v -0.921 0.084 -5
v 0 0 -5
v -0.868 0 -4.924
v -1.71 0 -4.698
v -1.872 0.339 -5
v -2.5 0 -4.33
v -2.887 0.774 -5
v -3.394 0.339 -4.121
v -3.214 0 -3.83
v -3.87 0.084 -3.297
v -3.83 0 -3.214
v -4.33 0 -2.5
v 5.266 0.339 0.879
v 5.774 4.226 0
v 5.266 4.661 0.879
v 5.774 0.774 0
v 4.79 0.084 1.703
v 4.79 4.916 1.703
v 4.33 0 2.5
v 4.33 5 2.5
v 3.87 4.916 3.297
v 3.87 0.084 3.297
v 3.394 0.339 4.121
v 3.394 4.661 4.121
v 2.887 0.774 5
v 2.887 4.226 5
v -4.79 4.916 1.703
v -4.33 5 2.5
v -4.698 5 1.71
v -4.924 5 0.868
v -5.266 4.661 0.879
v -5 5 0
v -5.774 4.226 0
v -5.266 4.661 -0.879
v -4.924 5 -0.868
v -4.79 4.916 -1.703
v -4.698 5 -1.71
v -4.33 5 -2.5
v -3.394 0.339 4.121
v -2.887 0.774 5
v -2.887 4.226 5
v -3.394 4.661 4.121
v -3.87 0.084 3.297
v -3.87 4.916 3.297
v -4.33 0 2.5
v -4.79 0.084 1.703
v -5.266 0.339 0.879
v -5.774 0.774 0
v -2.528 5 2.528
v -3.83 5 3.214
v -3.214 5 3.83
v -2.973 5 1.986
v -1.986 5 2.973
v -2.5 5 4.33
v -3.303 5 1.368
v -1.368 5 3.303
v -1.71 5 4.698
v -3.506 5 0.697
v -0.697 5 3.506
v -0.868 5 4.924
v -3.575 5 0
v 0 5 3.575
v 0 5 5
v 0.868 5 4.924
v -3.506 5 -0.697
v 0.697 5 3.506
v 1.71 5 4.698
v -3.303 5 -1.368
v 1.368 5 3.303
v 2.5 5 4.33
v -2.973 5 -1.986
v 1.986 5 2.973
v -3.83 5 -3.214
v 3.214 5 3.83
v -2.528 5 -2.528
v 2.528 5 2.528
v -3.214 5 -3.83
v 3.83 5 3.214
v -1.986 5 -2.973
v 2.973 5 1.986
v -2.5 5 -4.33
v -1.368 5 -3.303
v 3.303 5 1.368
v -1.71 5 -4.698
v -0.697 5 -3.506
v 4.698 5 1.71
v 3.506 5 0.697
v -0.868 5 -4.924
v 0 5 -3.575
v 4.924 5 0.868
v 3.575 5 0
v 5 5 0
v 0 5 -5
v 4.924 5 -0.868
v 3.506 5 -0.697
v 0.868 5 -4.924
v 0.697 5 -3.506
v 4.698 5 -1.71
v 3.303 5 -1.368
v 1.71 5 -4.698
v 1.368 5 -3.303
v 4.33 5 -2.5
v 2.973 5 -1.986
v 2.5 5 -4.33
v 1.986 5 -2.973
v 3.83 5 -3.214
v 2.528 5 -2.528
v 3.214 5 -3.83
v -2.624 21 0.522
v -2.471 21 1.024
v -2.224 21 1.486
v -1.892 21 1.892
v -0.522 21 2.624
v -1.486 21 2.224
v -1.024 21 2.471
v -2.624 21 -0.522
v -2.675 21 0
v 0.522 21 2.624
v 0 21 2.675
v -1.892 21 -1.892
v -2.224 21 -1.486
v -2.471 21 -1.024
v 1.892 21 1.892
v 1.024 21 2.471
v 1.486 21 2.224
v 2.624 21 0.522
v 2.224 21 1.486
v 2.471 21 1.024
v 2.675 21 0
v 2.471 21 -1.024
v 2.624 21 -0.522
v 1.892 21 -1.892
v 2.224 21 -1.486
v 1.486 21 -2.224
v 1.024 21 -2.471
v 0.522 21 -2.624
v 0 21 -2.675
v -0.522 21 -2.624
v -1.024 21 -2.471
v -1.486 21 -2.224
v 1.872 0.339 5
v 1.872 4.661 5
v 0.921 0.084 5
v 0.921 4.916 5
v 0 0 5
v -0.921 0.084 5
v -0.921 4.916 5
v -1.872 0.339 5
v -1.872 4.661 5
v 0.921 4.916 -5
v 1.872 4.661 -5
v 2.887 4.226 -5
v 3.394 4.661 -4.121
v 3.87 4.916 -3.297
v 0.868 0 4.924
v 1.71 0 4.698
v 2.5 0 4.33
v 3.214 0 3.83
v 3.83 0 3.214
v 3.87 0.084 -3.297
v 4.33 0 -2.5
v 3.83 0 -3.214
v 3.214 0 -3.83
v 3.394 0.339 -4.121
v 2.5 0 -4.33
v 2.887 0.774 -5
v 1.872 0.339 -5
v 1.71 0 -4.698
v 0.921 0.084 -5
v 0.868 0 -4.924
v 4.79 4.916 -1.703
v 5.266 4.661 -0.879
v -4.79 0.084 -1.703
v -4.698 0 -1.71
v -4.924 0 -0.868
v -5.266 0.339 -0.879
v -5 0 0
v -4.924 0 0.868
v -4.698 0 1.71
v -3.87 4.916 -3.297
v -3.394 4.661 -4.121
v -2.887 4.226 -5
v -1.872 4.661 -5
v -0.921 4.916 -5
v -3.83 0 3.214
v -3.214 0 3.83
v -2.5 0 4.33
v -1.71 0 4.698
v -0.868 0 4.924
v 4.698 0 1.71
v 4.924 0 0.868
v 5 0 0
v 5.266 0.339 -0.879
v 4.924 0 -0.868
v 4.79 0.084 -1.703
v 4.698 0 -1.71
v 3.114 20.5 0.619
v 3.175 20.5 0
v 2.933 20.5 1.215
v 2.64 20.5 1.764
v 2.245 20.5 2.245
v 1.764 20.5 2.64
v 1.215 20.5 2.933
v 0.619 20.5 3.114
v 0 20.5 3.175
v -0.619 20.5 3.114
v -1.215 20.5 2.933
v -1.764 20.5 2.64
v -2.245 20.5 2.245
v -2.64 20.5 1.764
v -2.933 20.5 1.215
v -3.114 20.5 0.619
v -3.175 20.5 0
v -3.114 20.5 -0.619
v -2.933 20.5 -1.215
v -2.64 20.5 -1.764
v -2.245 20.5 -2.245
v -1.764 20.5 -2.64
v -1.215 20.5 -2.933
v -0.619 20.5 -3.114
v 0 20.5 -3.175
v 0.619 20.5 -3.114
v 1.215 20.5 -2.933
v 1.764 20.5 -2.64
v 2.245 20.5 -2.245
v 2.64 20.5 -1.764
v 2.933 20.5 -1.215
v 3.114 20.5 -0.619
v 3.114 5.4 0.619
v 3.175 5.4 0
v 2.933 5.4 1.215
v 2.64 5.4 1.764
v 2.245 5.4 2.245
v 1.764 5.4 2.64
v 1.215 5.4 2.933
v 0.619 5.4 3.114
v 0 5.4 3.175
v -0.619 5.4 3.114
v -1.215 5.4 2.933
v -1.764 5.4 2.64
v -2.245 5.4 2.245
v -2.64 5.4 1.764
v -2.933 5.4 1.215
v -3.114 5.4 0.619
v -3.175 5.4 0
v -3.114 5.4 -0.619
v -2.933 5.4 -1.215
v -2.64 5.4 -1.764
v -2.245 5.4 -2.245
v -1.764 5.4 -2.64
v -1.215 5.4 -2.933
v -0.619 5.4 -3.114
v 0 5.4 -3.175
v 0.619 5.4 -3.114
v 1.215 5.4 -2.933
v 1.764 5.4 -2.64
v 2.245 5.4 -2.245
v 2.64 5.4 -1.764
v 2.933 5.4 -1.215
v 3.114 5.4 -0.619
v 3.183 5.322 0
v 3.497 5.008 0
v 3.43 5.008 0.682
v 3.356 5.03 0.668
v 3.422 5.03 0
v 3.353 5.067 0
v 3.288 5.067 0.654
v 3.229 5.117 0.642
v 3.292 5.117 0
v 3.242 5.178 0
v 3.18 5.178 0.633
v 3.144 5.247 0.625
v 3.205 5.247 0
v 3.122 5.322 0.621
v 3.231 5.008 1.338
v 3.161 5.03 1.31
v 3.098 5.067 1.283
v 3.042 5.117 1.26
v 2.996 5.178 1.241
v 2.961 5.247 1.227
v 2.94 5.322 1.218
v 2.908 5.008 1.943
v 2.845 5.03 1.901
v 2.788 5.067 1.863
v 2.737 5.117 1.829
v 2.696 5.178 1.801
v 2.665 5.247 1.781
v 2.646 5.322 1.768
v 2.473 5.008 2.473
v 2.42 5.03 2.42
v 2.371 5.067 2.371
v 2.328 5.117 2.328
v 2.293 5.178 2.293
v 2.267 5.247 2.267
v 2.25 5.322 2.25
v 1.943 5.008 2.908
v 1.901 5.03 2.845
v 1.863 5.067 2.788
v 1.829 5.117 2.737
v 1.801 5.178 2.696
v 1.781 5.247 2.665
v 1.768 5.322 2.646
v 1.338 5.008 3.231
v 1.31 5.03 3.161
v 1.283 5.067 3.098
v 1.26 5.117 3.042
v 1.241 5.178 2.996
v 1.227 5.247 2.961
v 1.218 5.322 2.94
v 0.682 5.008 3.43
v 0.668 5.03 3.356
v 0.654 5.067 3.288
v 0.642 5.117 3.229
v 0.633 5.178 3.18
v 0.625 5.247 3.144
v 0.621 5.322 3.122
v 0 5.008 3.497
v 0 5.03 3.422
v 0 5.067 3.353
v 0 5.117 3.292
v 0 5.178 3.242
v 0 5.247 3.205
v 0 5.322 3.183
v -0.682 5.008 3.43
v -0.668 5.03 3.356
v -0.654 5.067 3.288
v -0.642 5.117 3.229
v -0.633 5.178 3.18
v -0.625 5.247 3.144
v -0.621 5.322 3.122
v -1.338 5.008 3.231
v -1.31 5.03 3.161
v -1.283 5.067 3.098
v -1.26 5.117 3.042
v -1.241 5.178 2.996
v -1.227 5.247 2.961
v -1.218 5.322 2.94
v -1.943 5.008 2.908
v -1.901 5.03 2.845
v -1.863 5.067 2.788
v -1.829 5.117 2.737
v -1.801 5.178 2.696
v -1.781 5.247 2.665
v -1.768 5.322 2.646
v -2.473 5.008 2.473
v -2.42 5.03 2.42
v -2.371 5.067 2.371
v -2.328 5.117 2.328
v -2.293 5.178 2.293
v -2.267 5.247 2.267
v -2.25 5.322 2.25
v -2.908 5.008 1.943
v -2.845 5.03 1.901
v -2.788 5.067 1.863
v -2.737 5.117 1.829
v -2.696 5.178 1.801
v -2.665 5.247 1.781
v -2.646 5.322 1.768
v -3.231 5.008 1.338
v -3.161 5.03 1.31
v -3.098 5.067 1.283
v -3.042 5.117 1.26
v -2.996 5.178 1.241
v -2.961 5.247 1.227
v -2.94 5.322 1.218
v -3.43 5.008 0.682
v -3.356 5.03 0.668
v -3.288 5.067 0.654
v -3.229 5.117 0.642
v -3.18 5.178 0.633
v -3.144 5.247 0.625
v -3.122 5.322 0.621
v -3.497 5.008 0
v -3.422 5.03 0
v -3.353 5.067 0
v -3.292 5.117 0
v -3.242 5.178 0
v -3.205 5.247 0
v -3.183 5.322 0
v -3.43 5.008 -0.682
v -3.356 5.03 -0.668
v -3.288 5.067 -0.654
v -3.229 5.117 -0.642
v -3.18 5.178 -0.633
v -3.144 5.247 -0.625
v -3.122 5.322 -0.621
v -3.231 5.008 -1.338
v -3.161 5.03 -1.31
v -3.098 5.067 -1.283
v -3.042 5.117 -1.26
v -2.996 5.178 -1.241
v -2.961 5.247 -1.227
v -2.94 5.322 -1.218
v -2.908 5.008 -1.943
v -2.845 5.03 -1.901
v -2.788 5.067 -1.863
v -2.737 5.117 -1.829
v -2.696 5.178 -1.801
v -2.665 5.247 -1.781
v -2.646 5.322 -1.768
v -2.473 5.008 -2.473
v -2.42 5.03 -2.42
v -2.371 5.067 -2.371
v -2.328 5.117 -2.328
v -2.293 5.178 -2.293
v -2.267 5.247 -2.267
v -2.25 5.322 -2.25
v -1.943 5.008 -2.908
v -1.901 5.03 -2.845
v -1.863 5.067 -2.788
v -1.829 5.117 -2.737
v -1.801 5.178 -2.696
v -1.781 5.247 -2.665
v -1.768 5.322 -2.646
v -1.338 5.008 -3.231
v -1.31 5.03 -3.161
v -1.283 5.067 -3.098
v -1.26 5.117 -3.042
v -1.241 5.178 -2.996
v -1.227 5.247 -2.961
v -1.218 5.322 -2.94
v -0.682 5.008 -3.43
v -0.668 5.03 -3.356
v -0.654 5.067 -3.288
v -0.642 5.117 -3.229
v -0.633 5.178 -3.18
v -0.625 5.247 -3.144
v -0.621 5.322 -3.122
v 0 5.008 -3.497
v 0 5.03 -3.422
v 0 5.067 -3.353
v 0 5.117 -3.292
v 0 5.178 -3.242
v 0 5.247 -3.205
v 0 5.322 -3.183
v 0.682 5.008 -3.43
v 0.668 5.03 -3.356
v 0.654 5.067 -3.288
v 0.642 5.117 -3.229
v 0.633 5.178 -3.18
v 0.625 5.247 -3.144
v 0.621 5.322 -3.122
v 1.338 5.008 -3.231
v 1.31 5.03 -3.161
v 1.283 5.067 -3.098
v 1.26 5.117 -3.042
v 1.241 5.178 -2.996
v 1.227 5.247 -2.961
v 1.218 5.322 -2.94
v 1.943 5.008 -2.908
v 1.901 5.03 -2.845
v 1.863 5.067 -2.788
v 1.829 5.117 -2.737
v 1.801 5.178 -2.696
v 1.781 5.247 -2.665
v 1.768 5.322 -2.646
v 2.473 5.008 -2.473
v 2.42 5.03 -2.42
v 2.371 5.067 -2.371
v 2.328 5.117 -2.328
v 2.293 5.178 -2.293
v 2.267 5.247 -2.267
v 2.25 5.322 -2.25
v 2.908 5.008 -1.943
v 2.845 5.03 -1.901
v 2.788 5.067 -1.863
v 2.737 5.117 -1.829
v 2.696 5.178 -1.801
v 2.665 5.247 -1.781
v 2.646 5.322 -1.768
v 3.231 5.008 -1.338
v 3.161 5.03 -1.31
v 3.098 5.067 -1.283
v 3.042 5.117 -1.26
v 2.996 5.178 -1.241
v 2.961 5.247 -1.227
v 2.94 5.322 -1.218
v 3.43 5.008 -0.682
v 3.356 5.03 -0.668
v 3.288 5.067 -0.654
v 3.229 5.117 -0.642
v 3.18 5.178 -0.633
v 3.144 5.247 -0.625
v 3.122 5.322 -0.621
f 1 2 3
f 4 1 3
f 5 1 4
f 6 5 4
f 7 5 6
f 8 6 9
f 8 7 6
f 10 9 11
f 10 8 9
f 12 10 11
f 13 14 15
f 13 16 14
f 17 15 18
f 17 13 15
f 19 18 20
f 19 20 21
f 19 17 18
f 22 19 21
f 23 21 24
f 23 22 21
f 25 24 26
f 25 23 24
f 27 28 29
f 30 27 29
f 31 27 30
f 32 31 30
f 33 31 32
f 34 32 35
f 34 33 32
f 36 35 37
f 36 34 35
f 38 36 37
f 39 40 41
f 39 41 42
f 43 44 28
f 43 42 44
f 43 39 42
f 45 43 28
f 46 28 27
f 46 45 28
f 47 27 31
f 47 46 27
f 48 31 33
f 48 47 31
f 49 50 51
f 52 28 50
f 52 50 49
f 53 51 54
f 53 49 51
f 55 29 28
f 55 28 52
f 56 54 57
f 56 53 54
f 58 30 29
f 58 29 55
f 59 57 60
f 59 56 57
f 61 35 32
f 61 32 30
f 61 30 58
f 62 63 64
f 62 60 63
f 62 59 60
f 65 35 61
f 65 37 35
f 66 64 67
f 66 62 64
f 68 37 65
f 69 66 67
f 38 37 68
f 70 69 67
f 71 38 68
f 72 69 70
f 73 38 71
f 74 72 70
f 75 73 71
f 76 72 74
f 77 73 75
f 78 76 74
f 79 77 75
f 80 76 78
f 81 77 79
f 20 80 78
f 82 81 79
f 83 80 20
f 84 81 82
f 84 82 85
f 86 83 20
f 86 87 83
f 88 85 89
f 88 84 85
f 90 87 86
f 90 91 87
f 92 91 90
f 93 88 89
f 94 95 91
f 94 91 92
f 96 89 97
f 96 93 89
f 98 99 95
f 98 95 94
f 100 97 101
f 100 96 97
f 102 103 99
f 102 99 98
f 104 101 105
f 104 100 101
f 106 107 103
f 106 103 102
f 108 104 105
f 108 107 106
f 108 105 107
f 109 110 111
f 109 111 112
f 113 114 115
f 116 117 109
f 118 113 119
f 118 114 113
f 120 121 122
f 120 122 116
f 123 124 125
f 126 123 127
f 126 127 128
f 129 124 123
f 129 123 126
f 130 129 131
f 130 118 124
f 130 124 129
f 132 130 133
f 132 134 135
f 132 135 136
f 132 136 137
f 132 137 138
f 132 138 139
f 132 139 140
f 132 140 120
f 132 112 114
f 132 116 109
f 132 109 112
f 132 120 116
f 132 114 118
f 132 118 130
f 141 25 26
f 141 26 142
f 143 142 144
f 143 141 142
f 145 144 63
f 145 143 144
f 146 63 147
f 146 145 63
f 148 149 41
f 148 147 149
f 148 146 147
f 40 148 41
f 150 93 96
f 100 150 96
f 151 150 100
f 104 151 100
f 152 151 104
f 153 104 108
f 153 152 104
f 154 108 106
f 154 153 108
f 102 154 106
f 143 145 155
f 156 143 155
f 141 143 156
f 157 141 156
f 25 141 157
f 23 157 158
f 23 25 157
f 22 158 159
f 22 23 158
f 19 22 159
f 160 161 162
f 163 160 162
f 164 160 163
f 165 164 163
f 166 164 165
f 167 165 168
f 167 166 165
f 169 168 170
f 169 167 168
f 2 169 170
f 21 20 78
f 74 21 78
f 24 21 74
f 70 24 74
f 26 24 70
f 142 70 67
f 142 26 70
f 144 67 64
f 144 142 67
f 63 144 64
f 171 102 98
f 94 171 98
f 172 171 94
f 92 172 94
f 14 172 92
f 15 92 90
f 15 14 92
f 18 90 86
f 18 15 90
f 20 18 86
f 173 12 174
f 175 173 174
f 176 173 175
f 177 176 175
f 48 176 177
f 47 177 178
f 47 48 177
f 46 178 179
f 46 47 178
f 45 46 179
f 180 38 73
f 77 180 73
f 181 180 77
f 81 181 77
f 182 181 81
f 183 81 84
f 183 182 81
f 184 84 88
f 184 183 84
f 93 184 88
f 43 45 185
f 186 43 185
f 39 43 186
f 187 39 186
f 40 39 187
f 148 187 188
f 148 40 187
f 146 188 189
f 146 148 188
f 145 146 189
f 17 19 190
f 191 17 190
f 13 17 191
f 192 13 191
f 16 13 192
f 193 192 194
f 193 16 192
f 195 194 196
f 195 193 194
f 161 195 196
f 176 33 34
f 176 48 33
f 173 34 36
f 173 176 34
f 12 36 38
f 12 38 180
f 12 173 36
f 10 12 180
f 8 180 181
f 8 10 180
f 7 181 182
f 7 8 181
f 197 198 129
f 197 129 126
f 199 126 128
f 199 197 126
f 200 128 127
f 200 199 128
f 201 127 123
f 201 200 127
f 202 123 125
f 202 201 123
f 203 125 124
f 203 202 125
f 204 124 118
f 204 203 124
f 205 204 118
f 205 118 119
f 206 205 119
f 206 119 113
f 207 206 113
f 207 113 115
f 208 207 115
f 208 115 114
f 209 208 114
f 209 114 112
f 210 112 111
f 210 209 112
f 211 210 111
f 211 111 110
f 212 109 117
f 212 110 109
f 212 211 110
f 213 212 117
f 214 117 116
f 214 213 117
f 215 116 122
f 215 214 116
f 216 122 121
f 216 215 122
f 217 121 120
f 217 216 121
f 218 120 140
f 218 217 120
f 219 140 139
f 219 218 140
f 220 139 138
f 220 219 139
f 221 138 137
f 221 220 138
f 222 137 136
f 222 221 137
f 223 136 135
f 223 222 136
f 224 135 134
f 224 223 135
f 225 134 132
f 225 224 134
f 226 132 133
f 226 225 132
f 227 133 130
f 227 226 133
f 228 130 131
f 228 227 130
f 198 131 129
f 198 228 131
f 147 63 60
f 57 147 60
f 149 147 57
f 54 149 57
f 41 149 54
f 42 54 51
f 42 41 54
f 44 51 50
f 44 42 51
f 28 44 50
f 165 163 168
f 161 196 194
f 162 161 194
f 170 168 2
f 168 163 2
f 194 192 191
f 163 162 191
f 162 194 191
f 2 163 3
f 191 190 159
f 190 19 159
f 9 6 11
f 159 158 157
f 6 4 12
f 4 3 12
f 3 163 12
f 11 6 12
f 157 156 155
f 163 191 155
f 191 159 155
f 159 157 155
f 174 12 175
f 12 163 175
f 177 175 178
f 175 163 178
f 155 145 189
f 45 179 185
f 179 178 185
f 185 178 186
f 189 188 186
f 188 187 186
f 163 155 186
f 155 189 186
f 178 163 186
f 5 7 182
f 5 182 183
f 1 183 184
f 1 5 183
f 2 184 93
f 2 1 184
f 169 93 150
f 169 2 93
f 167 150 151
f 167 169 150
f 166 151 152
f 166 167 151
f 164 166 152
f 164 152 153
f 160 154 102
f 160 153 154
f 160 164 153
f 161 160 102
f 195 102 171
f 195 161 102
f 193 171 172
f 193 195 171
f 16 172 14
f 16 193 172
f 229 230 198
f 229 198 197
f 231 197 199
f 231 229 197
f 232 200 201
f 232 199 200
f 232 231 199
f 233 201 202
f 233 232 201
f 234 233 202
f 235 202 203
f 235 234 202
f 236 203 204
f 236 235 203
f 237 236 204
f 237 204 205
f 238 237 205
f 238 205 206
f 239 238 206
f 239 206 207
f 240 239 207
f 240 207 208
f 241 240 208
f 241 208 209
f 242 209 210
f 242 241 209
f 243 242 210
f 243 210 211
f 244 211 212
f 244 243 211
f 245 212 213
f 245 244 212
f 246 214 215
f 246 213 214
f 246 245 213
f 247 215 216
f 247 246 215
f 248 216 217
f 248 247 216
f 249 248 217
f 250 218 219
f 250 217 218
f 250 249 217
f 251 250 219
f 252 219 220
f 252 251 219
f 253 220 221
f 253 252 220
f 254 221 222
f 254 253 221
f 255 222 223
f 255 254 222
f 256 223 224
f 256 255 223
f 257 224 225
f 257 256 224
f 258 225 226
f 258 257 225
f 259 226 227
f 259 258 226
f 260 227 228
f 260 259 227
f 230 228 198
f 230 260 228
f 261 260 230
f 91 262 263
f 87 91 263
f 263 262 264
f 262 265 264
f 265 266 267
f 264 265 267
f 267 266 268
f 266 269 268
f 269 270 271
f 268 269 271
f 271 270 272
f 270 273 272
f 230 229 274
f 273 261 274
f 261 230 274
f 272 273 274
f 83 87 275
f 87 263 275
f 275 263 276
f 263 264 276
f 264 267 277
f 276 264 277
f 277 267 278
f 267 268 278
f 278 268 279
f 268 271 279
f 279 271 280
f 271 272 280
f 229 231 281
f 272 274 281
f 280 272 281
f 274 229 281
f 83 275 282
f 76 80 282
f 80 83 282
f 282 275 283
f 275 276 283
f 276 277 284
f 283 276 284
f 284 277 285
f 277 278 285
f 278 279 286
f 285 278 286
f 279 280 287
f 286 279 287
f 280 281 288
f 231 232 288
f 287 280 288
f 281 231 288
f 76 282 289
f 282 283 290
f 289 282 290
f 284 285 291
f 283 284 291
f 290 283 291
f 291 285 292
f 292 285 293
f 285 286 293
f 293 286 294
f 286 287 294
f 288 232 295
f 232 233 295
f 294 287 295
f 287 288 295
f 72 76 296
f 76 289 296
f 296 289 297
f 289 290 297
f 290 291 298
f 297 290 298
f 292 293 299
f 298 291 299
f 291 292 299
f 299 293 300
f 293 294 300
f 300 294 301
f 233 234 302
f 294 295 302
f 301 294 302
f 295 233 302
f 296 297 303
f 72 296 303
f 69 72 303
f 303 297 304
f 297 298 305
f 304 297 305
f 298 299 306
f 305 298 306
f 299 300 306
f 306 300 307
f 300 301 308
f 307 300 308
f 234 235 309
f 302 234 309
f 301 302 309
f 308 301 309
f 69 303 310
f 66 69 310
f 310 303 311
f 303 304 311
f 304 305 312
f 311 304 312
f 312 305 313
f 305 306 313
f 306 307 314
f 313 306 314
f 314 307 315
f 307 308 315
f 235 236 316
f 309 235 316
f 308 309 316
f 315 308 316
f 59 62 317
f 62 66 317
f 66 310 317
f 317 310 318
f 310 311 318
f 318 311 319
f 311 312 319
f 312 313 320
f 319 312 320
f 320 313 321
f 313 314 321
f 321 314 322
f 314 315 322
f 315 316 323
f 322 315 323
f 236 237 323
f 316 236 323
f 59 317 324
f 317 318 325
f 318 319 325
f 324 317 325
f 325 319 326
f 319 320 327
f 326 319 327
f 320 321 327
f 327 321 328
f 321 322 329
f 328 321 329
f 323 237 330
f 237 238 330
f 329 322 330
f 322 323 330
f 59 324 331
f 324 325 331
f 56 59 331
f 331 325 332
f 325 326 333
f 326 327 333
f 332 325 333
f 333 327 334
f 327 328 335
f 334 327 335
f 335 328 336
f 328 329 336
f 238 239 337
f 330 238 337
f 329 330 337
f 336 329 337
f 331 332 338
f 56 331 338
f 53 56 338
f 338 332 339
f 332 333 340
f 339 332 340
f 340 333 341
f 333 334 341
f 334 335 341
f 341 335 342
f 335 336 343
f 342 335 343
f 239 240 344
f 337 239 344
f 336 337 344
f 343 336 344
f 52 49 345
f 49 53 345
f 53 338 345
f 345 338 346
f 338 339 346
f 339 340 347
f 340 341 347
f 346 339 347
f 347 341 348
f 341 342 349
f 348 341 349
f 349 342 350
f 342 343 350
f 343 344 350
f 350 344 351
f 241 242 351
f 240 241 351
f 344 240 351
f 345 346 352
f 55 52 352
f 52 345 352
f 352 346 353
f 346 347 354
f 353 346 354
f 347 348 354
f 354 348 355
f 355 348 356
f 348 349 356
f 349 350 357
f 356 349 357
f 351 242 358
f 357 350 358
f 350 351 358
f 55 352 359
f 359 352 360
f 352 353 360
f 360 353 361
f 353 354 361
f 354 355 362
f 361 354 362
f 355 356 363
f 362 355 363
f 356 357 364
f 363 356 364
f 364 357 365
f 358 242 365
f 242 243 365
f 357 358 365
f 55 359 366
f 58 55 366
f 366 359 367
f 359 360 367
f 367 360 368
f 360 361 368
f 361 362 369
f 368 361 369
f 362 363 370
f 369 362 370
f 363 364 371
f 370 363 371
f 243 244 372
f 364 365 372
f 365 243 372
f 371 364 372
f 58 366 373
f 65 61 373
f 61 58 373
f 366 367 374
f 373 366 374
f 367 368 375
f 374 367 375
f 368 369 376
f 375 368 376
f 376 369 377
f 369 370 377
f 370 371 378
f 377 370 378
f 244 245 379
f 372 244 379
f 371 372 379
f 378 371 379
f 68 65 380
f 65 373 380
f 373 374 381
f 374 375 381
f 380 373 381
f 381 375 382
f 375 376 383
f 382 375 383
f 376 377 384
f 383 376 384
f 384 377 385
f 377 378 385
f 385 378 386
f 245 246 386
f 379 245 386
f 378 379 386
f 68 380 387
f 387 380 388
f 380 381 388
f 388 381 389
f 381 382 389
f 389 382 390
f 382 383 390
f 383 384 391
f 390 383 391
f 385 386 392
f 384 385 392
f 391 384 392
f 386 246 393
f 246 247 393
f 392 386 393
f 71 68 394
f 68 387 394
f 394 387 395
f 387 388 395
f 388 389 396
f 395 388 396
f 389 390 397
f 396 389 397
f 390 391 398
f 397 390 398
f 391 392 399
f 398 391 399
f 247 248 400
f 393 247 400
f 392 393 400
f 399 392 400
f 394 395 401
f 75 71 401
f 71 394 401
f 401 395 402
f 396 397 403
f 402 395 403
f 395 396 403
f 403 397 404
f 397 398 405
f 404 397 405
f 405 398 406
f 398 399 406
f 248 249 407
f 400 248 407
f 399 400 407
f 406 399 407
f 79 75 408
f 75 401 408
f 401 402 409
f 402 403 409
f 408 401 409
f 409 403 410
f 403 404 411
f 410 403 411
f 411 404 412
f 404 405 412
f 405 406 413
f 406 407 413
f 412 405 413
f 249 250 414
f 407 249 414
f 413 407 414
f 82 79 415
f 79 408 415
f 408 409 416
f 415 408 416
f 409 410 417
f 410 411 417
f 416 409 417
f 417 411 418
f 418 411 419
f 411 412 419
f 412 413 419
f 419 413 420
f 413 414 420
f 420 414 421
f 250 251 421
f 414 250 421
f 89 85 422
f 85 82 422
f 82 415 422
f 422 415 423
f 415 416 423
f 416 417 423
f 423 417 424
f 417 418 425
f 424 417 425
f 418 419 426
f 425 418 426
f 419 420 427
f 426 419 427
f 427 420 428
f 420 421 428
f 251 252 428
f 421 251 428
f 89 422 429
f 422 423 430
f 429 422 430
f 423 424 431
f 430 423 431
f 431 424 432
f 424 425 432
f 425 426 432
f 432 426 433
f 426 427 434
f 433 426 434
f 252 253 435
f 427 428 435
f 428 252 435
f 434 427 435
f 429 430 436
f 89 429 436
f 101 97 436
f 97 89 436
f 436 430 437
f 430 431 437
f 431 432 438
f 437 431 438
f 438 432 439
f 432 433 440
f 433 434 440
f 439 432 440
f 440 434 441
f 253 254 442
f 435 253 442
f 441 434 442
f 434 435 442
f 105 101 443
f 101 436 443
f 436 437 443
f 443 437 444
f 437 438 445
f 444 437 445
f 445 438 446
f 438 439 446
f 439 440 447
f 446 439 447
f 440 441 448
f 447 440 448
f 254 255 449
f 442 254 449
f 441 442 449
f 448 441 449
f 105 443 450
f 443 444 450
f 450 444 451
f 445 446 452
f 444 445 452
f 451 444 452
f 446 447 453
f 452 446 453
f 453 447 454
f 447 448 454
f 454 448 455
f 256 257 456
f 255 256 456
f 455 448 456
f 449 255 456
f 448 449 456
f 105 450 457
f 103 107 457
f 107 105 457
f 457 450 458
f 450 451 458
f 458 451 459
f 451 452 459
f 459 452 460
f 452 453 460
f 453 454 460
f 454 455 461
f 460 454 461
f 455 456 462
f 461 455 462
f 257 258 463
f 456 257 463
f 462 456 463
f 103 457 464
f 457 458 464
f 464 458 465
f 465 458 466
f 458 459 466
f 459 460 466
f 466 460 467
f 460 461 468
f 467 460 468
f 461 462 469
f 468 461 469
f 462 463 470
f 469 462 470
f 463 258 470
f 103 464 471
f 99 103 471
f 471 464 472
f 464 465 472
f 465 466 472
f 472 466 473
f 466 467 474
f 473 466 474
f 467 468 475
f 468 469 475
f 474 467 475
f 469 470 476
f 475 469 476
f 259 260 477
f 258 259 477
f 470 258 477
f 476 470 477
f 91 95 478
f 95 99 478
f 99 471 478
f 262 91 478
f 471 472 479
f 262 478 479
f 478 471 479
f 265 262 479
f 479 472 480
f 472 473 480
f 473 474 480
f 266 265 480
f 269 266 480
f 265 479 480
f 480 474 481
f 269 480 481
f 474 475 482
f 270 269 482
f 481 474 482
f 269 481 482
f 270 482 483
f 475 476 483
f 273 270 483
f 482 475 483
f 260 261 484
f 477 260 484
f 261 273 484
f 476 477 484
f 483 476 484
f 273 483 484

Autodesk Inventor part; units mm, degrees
ref_plane "YZ Plane" through (0, 0, 0) normal (1, 0, 0) x (0, 1, 0)
ref_plane "XZ Plane" through (0, 0, 0) normal (0, 1, 0) x (-1, 0, 0)
ref_plane "XY Plane" through (0, 0, 0) normal (0, 0, 1) x (1, 0, 0)
sketch "Esboço1" plane through (0, 0, 0) normal (0, 1, 0) x (-1, 0, 0)
  circle A0 centre (0, 0) radius 3
  line L0 (-2.8868, -5) -> (-5.7735, 0)
  line L1 (-5.7735, 0) -> (-2.8868, 5)
  line L2 (-2.8868, 5) -> (2.8868, 5)
  line L3 (2.8868, 5) -> (5.7735, 0)
  line L4 (5.7735, 0) -> (2.8868, -5)
  line L5 (2.8868, -5) -> (-2.8868, -5)
  dimension "d0" = 6
extrude "Extrusão1" add sketch "Esboço1" along normal blind 5
sketch "Esboço2" plane through (0, 0, 0) normal (1, 0, 0) x (0, 1, 0)
  point P0 (0, 0)
chamfer "Chanfro1" distance 0.5 angle 45 2 edges at (3, 0, 0) (3, 5, 0)
sketch "Esboço5" plane through (0, 0, 0) normal (0, -1, 0) x (1, 0, 0)
  circle A0 centre (0, 0) radius 5
extrude "Extrusão2" cut sketch "Esboço5" against normal through all draft 45 keep common part
sketch "Esboço6" plane through (0, 5, 0) normal (0, 1, 0) x (1, 0, 0)
  circle A0 centre (0, 0) radius 5
extrude "Extrusão3" cut sketch "Esboço6" against normal through all draft 45 keep common part
sketch "Esboço7" plane through (0, 5, 0) normal (0, 1, 0) x (1, 0, 0)
  circle A0 centre (0, 0) radius 3.5
extrude "Extrusão4" add sketch "Esboço7" against normal blind 5
sketch "Esboço8" plane through (0, 5, 0) normal (0, 1, 0) x (1, 0, 0)
  circle A0 centre (0, 0) radius 3.175
  dimension "d16" = 6.35
extrude "Extrusão5" add sketch "Esboço8" along normal blind 16
fillet "Arredondamento2" radius 0.4 1 edges at (-3.175, 5, 0)
chamfer "Chanfro3" distance 0.5 angle 45 1 edges at (-3.175, 21, 0)
thread "Rosca3" size "1/4-14" class "2B" standard "Inch Tapping Threads" full length
properties part number "porca m6" material "Aço inoxidável"
